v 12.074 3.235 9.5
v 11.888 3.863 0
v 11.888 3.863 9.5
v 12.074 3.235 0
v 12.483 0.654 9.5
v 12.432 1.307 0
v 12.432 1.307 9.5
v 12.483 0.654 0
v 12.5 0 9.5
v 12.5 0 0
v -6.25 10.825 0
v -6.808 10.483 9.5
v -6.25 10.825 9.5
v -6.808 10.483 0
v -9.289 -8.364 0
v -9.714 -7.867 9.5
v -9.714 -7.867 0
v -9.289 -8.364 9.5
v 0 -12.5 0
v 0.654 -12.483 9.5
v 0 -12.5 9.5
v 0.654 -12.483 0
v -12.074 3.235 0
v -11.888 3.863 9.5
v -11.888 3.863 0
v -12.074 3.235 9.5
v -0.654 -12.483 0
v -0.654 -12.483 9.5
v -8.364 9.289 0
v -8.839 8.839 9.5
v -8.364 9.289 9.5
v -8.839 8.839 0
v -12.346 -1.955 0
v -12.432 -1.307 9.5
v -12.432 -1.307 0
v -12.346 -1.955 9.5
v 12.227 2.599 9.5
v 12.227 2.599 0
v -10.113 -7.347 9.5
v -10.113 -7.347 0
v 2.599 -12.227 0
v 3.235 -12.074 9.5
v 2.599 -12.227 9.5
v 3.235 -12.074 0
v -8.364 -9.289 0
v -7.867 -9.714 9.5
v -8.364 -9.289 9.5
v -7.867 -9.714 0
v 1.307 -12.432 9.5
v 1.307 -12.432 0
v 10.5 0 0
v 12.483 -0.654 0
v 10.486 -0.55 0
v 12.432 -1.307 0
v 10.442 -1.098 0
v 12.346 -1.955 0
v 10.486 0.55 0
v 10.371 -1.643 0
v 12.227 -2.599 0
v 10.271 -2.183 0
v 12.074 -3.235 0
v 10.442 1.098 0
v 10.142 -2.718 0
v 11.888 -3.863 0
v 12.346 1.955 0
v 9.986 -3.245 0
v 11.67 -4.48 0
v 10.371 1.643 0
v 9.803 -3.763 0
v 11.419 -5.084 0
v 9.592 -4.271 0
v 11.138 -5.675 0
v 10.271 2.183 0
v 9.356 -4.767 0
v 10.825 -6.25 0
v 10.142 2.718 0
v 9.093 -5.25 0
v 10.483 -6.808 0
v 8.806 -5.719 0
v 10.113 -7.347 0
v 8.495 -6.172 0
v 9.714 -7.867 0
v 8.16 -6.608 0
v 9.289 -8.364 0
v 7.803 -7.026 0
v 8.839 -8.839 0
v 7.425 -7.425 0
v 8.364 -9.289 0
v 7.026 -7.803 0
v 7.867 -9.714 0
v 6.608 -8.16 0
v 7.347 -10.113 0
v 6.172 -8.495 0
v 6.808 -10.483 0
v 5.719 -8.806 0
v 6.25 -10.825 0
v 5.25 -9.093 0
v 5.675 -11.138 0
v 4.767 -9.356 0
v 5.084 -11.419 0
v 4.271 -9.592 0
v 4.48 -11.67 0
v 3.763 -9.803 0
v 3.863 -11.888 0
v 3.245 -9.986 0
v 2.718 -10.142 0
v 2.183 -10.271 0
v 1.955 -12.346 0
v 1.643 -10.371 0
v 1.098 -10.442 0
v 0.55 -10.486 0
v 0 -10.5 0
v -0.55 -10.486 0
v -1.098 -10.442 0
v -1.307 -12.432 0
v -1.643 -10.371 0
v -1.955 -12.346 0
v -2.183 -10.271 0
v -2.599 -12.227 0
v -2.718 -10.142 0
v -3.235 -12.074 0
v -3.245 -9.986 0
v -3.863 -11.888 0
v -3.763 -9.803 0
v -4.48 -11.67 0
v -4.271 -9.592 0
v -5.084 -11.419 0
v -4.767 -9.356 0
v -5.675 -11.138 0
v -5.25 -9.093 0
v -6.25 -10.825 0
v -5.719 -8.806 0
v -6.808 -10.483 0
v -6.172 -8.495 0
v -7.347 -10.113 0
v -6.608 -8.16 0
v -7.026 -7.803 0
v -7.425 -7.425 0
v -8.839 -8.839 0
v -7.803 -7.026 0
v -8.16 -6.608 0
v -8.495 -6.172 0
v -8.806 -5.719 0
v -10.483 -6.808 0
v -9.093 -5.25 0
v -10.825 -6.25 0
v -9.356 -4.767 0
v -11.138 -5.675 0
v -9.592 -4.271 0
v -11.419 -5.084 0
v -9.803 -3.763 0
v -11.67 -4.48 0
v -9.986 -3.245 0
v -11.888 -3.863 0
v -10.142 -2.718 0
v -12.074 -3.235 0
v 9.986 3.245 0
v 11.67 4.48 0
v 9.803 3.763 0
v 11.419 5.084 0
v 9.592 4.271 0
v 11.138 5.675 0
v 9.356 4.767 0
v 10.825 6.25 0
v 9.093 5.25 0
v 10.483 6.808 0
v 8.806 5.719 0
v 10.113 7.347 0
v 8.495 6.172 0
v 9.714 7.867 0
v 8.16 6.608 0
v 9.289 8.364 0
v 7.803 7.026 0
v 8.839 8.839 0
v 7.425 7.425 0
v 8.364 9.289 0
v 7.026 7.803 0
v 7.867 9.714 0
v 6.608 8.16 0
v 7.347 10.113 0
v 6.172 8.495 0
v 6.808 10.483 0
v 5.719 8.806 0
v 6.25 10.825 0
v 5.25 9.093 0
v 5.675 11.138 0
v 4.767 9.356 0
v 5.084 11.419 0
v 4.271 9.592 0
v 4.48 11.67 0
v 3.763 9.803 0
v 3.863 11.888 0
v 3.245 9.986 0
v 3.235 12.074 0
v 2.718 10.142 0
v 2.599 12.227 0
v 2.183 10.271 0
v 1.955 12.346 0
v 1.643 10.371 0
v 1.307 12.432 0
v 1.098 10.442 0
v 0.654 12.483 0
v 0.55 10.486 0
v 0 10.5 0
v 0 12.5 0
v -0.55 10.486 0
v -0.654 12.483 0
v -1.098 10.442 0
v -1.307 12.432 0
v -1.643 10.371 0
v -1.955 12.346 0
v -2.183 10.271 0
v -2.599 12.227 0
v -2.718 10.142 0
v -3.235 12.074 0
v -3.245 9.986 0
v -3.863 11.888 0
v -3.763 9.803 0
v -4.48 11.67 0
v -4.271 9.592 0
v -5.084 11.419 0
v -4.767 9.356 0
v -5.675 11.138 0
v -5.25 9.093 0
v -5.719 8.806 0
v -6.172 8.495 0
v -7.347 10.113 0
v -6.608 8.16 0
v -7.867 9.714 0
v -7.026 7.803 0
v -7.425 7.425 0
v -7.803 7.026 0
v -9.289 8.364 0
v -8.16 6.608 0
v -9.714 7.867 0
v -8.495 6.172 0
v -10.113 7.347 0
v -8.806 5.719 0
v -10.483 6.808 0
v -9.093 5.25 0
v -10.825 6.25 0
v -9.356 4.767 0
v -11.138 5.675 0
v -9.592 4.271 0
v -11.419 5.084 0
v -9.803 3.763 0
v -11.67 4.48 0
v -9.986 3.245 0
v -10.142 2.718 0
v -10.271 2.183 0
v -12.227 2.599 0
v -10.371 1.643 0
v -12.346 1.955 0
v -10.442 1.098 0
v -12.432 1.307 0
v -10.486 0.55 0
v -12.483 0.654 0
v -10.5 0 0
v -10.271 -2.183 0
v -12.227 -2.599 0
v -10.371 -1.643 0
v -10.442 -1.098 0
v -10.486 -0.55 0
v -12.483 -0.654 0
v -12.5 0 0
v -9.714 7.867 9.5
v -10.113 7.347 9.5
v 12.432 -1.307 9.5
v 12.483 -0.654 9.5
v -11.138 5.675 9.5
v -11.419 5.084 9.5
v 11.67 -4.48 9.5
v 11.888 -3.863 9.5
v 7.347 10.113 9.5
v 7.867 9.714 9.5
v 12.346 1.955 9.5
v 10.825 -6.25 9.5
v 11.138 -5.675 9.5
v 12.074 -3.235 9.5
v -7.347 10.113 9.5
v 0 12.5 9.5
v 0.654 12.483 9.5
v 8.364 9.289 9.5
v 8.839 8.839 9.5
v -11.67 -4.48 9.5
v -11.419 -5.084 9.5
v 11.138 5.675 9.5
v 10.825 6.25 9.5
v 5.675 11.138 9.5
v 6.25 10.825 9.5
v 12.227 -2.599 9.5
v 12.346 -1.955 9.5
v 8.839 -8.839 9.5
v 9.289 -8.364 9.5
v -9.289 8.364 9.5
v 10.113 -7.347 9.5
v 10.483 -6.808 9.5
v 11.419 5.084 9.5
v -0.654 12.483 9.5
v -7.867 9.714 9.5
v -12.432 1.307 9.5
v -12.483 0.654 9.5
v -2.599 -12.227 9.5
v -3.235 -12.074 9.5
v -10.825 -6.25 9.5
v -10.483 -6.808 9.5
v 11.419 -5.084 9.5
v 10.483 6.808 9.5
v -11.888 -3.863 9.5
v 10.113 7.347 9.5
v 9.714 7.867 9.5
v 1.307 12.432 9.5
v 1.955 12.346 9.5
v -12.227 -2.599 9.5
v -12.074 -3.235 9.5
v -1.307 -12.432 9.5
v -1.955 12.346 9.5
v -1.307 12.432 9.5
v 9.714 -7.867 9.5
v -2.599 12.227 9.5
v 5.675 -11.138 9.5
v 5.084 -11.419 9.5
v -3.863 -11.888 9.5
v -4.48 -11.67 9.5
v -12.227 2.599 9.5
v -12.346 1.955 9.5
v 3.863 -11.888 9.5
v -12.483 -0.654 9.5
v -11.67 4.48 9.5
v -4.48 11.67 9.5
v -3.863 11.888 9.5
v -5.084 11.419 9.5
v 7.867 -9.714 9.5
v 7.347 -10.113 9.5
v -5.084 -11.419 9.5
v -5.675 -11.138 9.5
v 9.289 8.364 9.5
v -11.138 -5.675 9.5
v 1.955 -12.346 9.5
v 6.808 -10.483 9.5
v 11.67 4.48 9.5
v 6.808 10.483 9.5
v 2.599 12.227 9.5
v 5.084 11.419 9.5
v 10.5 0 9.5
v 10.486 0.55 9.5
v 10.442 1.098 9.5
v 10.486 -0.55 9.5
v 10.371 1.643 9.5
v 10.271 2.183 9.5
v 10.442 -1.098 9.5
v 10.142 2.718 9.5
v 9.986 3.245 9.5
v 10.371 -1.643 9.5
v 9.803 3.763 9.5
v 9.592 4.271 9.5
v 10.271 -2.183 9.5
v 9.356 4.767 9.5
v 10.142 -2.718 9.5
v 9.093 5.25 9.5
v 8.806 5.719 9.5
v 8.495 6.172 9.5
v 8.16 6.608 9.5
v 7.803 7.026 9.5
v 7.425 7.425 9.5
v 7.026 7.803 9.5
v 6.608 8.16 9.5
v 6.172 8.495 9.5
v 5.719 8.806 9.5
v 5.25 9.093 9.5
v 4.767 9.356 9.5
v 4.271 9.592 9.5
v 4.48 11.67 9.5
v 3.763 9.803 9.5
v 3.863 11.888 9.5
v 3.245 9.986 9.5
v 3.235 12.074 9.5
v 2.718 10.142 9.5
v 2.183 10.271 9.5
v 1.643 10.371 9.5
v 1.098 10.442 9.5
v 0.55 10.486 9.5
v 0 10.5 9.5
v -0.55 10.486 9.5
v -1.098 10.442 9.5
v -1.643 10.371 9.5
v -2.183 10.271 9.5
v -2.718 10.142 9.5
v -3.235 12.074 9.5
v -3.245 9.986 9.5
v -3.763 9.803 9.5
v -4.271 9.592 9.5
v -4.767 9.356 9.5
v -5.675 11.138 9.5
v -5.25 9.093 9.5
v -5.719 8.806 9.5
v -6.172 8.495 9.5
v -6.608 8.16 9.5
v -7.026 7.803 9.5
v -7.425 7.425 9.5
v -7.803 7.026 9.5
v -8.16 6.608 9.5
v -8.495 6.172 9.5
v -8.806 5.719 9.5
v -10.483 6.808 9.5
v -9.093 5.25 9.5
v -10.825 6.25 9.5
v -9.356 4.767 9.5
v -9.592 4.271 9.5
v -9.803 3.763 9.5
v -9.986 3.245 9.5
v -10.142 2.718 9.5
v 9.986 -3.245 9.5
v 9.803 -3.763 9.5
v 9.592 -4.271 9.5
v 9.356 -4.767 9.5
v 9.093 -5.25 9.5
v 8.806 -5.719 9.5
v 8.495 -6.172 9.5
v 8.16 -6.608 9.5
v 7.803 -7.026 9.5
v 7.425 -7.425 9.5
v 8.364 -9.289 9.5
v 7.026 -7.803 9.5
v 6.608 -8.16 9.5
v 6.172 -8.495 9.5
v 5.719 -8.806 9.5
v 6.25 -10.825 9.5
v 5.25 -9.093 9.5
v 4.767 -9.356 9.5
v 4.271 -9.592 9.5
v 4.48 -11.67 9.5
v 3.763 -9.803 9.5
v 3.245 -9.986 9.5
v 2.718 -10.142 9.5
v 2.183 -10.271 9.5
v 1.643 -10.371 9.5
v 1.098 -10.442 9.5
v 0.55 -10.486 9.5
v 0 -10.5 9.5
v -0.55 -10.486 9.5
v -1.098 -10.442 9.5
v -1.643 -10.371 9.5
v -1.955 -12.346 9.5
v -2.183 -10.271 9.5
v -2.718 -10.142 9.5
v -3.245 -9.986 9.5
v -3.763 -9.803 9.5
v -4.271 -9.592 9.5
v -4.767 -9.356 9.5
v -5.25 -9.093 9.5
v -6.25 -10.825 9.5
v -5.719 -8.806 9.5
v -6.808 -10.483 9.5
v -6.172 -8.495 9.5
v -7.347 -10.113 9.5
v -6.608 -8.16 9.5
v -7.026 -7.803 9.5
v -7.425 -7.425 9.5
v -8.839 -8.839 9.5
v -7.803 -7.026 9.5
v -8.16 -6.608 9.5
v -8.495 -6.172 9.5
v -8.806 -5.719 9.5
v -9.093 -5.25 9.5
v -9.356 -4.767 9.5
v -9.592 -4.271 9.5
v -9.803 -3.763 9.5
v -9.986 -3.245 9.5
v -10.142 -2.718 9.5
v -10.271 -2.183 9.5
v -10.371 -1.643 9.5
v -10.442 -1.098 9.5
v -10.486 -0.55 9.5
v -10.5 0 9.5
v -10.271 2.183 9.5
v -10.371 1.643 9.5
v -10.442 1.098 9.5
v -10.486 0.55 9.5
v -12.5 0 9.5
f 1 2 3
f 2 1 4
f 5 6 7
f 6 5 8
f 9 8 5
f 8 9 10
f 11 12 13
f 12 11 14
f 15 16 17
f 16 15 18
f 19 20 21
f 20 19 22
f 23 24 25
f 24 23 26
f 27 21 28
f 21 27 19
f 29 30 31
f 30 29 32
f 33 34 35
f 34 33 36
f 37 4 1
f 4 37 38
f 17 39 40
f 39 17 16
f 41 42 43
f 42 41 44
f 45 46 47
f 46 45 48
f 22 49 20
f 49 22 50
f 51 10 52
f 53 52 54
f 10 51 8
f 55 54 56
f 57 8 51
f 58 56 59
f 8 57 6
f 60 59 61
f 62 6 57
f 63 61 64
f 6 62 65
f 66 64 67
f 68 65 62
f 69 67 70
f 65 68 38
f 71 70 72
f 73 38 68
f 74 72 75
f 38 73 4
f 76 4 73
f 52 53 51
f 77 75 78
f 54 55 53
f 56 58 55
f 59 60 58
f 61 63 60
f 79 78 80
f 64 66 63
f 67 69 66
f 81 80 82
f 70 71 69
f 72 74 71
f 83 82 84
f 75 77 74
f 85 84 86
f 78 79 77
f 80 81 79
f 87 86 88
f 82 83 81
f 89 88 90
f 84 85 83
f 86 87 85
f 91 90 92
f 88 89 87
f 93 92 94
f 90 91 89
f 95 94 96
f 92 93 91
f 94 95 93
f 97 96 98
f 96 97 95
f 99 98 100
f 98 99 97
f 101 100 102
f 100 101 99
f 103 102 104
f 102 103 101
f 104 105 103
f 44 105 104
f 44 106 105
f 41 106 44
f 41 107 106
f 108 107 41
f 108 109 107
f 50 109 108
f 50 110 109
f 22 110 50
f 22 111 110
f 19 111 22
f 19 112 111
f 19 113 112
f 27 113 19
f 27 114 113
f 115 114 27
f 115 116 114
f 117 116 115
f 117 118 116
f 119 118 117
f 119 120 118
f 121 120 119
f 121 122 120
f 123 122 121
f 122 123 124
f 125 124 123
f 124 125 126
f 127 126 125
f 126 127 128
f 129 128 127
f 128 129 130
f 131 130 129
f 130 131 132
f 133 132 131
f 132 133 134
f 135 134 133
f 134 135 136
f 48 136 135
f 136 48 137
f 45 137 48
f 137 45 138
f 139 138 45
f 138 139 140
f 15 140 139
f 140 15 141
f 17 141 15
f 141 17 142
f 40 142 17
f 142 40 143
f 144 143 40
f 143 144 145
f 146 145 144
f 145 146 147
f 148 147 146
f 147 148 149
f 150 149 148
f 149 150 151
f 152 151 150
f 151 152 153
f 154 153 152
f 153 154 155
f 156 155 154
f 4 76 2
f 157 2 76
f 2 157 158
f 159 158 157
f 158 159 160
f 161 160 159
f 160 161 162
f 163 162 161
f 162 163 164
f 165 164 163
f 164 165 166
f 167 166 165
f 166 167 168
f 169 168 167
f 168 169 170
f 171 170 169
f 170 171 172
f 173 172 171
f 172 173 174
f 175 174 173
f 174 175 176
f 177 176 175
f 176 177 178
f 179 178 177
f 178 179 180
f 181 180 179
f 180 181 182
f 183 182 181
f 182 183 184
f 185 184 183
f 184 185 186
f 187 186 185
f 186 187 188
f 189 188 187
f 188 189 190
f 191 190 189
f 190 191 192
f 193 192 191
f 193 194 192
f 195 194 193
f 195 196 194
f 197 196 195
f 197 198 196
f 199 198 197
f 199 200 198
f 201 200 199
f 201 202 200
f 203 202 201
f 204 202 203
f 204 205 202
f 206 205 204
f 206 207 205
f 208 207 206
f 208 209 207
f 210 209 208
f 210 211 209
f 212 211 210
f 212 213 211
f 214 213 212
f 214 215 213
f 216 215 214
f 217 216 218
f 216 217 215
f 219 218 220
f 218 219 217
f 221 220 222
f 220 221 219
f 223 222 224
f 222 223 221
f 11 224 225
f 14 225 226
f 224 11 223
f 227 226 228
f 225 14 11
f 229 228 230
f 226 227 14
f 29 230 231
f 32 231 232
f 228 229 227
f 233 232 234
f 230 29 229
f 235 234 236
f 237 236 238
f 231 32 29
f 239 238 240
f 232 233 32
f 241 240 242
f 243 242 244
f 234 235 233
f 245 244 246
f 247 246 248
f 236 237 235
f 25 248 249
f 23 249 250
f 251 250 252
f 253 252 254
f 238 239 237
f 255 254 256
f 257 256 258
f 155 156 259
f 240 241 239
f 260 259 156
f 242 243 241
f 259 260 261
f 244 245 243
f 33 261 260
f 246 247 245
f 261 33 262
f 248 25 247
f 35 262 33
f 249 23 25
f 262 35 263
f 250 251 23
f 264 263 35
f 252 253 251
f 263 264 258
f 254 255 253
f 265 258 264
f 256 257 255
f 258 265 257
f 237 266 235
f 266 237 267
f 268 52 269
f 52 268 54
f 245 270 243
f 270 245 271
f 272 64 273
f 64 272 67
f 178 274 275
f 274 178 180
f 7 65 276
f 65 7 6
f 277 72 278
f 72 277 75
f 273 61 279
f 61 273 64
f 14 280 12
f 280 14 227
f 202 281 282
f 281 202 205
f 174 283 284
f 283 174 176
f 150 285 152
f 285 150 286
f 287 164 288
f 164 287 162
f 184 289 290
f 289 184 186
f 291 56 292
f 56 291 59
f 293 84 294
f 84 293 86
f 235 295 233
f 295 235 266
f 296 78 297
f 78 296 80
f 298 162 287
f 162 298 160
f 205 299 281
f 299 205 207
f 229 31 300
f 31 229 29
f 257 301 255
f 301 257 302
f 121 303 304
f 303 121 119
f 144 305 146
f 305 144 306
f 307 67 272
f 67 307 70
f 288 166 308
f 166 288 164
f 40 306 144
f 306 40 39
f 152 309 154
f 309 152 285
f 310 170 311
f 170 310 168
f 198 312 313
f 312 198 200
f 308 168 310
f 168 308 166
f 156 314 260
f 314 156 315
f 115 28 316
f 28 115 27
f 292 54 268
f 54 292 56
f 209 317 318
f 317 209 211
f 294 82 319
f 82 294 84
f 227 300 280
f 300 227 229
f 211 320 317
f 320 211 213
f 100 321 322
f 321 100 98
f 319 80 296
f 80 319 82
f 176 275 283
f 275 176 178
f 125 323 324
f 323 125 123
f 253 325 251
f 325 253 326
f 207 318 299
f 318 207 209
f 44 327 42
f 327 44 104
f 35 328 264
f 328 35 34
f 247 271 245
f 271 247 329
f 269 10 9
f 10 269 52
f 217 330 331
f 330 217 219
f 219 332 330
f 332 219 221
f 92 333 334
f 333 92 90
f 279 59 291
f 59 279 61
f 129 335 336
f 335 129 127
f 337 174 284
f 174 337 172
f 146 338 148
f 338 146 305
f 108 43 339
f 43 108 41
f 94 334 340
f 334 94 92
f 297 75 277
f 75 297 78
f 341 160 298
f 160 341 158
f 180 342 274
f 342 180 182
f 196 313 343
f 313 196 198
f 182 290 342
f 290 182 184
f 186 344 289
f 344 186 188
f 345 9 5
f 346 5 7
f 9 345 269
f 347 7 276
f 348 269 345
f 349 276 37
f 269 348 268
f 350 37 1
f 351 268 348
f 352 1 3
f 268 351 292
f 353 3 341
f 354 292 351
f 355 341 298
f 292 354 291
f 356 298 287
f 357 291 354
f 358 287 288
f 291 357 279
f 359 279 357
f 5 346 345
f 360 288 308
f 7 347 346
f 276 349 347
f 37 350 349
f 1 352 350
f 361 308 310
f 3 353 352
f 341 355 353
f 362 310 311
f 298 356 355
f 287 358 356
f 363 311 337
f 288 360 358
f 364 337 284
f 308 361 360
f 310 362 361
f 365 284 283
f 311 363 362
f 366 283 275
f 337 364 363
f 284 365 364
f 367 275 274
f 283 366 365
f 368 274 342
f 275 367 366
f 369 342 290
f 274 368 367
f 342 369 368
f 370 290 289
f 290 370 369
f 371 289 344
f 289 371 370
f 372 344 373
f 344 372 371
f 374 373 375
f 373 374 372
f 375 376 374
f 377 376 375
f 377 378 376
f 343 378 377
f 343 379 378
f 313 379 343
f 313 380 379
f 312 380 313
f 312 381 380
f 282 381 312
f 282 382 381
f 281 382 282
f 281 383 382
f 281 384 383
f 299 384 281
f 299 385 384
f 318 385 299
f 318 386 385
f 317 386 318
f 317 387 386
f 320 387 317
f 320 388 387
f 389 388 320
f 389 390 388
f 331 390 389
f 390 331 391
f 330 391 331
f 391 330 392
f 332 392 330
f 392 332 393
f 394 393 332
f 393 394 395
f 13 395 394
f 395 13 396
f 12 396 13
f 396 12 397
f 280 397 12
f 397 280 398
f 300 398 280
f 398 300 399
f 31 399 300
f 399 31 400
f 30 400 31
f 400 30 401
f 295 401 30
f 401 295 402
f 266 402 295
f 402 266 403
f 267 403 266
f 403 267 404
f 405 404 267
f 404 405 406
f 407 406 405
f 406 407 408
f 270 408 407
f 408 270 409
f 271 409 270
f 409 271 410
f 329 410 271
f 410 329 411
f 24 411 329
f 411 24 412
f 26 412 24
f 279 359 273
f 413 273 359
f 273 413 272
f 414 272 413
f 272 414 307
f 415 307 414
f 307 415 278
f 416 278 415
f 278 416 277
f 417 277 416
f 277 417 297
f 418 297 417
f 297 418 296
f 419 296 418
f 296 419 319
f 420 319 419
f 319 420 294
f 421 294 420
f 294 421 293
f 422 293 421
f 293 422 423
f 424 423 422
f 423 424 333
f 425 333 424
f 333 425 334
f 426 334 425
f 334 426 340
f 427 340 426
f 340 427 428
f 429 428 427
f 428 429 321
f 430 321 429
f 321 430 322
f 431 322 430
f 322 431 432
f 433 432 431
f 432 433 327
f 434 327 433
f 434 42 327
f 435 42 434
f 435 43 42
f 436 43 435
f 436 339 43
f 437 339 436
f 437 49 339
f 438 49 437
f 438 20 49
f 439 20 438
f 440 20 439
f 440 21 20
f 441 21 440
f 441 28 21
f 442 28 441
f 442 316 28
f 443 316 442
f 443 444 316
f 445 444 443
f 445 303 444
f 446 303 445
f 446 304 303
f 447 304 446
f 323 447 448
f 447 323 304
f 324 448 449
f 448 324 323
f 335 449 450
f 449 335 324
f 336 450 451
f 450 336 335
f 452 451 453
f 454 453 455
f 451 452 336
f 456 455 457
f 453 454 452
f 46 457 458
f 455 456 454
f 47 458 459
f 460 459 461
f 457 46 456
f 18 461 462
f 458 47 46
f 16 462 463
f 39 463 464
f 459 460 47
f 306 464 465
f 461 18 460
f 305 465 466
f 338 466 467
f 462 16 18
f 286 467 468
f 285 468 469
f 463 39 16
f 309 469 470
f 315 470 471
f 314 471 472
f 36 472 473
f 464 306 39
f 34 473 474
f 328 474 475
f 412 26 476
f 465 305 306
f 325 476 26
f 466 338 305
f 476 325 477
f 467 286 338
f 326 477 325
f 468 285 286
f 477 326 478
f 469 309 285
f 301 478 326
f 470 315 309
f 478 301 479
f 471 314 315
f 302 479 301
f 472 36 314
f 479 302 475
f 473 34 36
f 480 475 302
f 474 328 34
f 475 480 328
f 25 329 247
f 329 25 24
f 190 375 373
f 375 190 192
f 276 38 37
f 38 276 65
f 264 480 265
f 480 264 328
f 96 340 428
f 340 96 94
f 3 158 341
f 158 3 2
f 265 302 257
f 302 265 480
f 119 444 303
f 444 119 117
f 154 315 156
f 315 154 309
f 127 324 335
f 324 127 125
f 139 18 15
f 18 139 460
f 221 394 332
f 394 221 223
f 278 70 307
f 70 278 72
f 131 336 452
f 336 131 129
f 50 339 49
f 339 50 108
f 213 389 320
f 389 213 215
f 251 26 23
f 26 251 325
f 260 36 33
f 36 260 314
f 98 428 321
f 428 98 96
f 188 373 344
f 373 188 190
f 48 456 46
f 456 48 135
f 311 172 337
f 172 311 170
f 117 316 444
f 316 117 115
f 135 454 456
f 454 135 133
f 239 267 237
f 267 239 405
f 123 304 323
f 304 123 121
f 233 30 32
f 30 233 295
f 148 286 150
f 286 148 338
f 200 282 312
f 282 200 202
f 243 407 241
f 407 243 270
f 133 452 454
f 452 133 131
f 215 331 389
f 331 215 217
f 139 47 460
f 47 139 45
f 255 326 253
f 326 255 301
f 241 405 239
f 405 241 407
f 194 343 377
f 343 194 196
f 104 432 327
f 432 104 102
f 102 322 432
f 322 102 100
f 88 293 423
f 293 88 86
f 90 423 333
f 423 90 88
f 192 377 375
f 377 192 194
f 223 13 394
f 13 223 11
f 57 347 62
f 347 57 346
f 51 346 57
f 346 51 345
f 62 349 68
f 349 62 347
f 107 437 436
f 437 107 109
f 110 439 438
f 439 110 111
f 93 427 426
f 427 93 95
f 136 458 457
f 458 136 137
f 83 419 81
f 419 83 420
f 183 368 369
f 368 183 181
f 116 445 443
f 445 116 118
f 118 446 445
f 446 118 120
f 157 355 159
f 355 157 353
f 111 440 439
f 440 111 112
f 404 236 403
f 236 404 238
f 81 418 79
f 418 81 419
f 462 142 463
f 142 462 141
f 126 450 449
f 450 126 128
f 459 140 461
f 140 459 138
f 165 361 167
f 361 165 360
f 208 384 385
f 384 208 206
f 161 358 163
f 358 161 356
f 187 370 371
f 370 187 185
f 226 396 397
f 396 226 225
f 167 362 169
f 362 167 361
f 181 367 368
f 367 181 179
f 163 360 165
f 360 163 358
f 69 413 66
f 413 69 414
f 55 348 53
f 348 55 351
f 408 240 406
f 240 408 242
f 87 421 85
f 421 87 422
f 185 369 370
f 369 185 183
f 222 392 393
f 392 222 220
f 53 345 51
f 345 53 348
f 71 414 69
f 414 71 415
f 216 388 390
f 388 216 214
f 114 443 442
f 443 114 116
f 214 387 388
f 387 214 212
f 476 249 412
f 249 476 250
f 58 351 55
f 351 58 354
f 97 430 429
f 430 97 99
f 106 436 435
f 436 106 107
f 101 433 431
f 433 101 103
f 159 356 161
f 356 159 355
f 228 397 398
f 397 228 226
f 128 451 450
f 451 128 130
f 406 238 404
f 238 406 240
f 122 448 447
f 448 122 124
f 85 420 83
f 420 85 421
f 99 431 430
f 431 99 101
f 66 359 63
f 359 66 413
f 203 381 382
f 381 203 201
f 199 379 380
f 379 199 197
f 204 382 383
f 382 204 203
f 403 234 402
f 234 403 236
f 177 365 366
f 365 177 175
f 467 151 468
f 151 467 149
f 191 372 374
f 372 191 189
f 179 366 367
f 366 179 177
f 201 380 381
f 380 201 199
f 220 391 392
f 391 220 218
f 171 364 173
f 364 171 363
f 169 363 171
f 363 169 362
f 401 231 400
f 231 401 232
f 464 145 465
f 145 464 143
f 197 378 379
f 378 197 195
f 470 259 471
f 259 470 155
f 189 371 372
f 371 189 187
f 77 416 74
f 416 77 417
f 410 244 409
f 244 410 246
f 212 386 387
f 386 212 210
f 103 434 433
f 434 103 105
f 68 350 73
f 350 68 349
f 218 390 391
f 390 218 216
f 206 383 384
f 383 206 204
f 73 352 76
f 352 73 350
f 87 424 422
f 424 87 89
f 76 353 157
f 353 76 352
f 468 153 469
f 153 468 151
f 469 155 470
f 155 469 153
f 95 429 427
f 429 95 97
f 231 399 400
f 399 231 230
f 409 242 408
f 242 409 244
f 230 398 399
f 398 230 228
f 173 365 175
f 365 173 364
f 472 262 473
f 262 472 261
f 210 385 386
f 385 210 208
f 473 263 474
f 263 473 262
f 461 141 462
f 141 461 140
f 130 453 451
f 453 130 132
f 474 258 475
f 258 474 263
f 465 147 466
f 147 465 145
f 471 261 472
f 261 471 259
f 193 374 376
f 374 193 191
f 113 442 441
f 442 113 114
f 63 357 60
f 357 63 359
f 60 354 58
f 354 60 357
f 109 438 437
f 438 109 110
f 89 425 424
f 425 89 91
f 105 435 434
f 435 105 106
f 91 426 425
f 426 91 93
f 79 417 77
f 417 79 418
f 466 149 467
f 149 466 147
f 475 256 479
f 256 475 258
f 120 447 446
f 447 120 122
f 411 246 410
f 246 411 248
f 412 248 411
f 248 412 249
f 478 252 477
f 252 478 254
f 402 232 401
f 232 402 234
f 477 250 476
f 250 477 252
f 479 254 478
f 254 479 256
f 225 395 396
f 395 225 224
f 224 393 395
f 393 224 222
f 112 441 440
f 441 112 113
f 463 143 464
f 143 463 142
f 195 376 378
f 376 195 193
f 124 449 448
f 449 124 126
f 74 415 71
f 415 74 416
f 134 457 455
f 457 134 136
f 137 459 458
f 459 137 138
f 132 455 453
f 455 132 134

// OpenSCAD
// file: model.scad
// Lux sensor capsule on the top of a 38.1 mm tube. Axis = tube axis, z up, z = 0 is the tube's top face.
// Three printed parts: base (plate + three zip-tie fingers down the tube), riser (ring the board sits on), cap (glass seat over the board).
// The VEML7700 lies under a PTFE disc and the cabochon; cat5 pairs go on a 2.54 mm screw terminal under the board. No extender board.
view = "closed";    // closed | section | cap_print | riser_print | base_print
exit = "center";    // center: cable down the hollow tube | side: cable out through a notch in the cap wall, +x
tube_od = 38.1; R_t = tube_od/2;
head_d = 34; bore_d = 25.2;          // head = glass + 4.4 mm wall
plate_t = 3;
// Window: same stack as lux-sensor-mount
cab_d = 24.8; cab_h = 6;             // owner's cabochon, measured
ptfe_t = 1;  capture = 1.5; seat_gap = 0.15; bevel = 30;
lux = [16.51, 16.51, 1.6];           // Adafruit VEML7700 4162, Eagle .brd
term = [12.7, 6, 7.5];               // 5-position 2.54 mm screw terminal under the board: a guess, not bought
riser_h = 9.5;                       // terminal 7.5 + 2 for wire ends
riser_od = 25; riser_id = 21;        // board corners (diag 23.3) rest on the ring
gap = 0.8;                           // board top to PTFE
screw_r = 14.8; screw_d = 1.8;       // two M2 self-tapping at +-y
tabs = [0, 120, 240]; tab_t = 3; tab_arc = 30; fh = 14; tie_z = -6.5;
slot_w = 6.5; slot_z = 4;
cap_z = plate_t;                     // cap and riser start on the plate
z_board = cap_z + riser_h; z_ptfe = z_board + lux[2] + gap; z_g = z_ptfe + ptfe_t;
cab_R = (pow(cab_d/2, 2) + cab_h*cab_h)/(2*cab_h); lip_r = cab_d/2 - capture;
lip_h = sqrt(cab_R*cab_R - lip_r*lip_r) - (cab_R - cab_h);
cap_top = z_g + lip_h + 1.2;
echo(overall = cap_top, dome_above_cap = z_g + cab_h - cap_top);
$fn = 120;
module glass(o = 0) translate([0, 0, z_g - (cab_R - cab_h)]) intersection() { sphere(r = cab_R + o); translate([-50, -50, cab_R - cab_h]) cube(100); }
module base() difference() {
  union() {
    cylinder(d = head_d, h = plate_t);
    for (a = tabs) rotate(a - tab_arc/2) rotate_extrude(angle = tab_arc) {
      square([R_t + 0.25 + tab_t, plate_t]);
      translate([R_t + 0.25, -fh]) square([tab_t, fh + plate_t]);
    }
  }
  translate([0, 0, tie_z - 1.7]) difference() { cylinder(d = 2*(R_t + 0.25 + tab_t) + 2, h = 3.4); translate([0, 0, -1]) cylinder(d = 2*(R_t + 0.25 + tab_t - 1.2), h = 6); }
  if (exit == "center") translate([0, 0, -1]) cylinder(d = 7, h = plate_t + 2);
  for (s = [-1, 1]) translate([0, s*screw_r, -1]) { cylinder(d = 2.4, h = plate_t + 2); cylinder(d = 4.2, h = 1 + 1.6); }
}
module riser() translate([0, 0, cap_z]) difference() {
  cylinder(d = riser_od, h = riser_h);
  translate([0, 0, -1]) cylinder(d = riser_id, h = riser_h + 2);
  if (exit == "side") translate([riser_od/2 - 3, -slot_w/2, -1]) cube([6, slot_w, slot_z + 1 + 0.01]);
}
module cap() difference() {
  translate([0, 0, cap_z]) cylinder(d = head_d, h = cap_top - cap_z);
  translate([0, 0, cap_z - 1]) cylinder(d = bore_d, h = z_g - cap_z + 1);
  glass(seat_gap);
  translate([0, 0, z_g + lip_h + 0.4]) cylinder(h = 20, r1 = lip_r, r2 = lip_r + 20/tan(bevel));
  for (s = [-1, 1]) translate([0, s*screw_r, cap_z - 1]) cylinder(d = screw_d, h = 9);
  if (exit == "side") hull() { translate([0, 0, cap_z + slot_z]) rotate([0, 90, 0]) cylinder(d = slot_w, h = 30); translate([0, -slot_w/2, cap_z - 1]) cube([30, slot_w, 1]); }
}
module parts() {
  color("SteelBlue") base(); color("LightSteelBlue") riser(); color("CadetBlue") cap();
  color("LightCyan", 0.6) glass(); color("white") translate([0, 0, z_ptfe]) cylinder(d = bore_d - 0.6, h = ptfe_t);
  color("green") translate([-lux[0]/2, -lux[1]/2, z_board]) cube(lux);
  color("Crimson") translate([-term[0]/2, 2 - term[1]/2, z_board - term[2]]) cube(term);
}
module tube() color("silver", 0.3) translate([0, 0, -60]) difference() { cylinder(d = tube_od, h = 60); translate([0, 0, -1]) cylinder(d = tube_od - 6, h = 62); }
if (view == "cap_print") translate([0, 0, -cap_z]) cap();
if (view == "riser_print") translate([0, 0, -cap_z]) riser();
if (view == "base_print") translate([0, 0, plate_t]) mirror([0, 0, 1]) base();   // plate top on the bed, fingers up
if (view == "closed") { parts(); tube(); }
if (view == "section") intersection() { union() { parts(); tube(); } translate([-100, -100, -100]) cube([200, 100, 300]); }
// main file
// riser-center print. Prints as shown.
include <model.scad>
view = "riser_print";
exit = "center";
